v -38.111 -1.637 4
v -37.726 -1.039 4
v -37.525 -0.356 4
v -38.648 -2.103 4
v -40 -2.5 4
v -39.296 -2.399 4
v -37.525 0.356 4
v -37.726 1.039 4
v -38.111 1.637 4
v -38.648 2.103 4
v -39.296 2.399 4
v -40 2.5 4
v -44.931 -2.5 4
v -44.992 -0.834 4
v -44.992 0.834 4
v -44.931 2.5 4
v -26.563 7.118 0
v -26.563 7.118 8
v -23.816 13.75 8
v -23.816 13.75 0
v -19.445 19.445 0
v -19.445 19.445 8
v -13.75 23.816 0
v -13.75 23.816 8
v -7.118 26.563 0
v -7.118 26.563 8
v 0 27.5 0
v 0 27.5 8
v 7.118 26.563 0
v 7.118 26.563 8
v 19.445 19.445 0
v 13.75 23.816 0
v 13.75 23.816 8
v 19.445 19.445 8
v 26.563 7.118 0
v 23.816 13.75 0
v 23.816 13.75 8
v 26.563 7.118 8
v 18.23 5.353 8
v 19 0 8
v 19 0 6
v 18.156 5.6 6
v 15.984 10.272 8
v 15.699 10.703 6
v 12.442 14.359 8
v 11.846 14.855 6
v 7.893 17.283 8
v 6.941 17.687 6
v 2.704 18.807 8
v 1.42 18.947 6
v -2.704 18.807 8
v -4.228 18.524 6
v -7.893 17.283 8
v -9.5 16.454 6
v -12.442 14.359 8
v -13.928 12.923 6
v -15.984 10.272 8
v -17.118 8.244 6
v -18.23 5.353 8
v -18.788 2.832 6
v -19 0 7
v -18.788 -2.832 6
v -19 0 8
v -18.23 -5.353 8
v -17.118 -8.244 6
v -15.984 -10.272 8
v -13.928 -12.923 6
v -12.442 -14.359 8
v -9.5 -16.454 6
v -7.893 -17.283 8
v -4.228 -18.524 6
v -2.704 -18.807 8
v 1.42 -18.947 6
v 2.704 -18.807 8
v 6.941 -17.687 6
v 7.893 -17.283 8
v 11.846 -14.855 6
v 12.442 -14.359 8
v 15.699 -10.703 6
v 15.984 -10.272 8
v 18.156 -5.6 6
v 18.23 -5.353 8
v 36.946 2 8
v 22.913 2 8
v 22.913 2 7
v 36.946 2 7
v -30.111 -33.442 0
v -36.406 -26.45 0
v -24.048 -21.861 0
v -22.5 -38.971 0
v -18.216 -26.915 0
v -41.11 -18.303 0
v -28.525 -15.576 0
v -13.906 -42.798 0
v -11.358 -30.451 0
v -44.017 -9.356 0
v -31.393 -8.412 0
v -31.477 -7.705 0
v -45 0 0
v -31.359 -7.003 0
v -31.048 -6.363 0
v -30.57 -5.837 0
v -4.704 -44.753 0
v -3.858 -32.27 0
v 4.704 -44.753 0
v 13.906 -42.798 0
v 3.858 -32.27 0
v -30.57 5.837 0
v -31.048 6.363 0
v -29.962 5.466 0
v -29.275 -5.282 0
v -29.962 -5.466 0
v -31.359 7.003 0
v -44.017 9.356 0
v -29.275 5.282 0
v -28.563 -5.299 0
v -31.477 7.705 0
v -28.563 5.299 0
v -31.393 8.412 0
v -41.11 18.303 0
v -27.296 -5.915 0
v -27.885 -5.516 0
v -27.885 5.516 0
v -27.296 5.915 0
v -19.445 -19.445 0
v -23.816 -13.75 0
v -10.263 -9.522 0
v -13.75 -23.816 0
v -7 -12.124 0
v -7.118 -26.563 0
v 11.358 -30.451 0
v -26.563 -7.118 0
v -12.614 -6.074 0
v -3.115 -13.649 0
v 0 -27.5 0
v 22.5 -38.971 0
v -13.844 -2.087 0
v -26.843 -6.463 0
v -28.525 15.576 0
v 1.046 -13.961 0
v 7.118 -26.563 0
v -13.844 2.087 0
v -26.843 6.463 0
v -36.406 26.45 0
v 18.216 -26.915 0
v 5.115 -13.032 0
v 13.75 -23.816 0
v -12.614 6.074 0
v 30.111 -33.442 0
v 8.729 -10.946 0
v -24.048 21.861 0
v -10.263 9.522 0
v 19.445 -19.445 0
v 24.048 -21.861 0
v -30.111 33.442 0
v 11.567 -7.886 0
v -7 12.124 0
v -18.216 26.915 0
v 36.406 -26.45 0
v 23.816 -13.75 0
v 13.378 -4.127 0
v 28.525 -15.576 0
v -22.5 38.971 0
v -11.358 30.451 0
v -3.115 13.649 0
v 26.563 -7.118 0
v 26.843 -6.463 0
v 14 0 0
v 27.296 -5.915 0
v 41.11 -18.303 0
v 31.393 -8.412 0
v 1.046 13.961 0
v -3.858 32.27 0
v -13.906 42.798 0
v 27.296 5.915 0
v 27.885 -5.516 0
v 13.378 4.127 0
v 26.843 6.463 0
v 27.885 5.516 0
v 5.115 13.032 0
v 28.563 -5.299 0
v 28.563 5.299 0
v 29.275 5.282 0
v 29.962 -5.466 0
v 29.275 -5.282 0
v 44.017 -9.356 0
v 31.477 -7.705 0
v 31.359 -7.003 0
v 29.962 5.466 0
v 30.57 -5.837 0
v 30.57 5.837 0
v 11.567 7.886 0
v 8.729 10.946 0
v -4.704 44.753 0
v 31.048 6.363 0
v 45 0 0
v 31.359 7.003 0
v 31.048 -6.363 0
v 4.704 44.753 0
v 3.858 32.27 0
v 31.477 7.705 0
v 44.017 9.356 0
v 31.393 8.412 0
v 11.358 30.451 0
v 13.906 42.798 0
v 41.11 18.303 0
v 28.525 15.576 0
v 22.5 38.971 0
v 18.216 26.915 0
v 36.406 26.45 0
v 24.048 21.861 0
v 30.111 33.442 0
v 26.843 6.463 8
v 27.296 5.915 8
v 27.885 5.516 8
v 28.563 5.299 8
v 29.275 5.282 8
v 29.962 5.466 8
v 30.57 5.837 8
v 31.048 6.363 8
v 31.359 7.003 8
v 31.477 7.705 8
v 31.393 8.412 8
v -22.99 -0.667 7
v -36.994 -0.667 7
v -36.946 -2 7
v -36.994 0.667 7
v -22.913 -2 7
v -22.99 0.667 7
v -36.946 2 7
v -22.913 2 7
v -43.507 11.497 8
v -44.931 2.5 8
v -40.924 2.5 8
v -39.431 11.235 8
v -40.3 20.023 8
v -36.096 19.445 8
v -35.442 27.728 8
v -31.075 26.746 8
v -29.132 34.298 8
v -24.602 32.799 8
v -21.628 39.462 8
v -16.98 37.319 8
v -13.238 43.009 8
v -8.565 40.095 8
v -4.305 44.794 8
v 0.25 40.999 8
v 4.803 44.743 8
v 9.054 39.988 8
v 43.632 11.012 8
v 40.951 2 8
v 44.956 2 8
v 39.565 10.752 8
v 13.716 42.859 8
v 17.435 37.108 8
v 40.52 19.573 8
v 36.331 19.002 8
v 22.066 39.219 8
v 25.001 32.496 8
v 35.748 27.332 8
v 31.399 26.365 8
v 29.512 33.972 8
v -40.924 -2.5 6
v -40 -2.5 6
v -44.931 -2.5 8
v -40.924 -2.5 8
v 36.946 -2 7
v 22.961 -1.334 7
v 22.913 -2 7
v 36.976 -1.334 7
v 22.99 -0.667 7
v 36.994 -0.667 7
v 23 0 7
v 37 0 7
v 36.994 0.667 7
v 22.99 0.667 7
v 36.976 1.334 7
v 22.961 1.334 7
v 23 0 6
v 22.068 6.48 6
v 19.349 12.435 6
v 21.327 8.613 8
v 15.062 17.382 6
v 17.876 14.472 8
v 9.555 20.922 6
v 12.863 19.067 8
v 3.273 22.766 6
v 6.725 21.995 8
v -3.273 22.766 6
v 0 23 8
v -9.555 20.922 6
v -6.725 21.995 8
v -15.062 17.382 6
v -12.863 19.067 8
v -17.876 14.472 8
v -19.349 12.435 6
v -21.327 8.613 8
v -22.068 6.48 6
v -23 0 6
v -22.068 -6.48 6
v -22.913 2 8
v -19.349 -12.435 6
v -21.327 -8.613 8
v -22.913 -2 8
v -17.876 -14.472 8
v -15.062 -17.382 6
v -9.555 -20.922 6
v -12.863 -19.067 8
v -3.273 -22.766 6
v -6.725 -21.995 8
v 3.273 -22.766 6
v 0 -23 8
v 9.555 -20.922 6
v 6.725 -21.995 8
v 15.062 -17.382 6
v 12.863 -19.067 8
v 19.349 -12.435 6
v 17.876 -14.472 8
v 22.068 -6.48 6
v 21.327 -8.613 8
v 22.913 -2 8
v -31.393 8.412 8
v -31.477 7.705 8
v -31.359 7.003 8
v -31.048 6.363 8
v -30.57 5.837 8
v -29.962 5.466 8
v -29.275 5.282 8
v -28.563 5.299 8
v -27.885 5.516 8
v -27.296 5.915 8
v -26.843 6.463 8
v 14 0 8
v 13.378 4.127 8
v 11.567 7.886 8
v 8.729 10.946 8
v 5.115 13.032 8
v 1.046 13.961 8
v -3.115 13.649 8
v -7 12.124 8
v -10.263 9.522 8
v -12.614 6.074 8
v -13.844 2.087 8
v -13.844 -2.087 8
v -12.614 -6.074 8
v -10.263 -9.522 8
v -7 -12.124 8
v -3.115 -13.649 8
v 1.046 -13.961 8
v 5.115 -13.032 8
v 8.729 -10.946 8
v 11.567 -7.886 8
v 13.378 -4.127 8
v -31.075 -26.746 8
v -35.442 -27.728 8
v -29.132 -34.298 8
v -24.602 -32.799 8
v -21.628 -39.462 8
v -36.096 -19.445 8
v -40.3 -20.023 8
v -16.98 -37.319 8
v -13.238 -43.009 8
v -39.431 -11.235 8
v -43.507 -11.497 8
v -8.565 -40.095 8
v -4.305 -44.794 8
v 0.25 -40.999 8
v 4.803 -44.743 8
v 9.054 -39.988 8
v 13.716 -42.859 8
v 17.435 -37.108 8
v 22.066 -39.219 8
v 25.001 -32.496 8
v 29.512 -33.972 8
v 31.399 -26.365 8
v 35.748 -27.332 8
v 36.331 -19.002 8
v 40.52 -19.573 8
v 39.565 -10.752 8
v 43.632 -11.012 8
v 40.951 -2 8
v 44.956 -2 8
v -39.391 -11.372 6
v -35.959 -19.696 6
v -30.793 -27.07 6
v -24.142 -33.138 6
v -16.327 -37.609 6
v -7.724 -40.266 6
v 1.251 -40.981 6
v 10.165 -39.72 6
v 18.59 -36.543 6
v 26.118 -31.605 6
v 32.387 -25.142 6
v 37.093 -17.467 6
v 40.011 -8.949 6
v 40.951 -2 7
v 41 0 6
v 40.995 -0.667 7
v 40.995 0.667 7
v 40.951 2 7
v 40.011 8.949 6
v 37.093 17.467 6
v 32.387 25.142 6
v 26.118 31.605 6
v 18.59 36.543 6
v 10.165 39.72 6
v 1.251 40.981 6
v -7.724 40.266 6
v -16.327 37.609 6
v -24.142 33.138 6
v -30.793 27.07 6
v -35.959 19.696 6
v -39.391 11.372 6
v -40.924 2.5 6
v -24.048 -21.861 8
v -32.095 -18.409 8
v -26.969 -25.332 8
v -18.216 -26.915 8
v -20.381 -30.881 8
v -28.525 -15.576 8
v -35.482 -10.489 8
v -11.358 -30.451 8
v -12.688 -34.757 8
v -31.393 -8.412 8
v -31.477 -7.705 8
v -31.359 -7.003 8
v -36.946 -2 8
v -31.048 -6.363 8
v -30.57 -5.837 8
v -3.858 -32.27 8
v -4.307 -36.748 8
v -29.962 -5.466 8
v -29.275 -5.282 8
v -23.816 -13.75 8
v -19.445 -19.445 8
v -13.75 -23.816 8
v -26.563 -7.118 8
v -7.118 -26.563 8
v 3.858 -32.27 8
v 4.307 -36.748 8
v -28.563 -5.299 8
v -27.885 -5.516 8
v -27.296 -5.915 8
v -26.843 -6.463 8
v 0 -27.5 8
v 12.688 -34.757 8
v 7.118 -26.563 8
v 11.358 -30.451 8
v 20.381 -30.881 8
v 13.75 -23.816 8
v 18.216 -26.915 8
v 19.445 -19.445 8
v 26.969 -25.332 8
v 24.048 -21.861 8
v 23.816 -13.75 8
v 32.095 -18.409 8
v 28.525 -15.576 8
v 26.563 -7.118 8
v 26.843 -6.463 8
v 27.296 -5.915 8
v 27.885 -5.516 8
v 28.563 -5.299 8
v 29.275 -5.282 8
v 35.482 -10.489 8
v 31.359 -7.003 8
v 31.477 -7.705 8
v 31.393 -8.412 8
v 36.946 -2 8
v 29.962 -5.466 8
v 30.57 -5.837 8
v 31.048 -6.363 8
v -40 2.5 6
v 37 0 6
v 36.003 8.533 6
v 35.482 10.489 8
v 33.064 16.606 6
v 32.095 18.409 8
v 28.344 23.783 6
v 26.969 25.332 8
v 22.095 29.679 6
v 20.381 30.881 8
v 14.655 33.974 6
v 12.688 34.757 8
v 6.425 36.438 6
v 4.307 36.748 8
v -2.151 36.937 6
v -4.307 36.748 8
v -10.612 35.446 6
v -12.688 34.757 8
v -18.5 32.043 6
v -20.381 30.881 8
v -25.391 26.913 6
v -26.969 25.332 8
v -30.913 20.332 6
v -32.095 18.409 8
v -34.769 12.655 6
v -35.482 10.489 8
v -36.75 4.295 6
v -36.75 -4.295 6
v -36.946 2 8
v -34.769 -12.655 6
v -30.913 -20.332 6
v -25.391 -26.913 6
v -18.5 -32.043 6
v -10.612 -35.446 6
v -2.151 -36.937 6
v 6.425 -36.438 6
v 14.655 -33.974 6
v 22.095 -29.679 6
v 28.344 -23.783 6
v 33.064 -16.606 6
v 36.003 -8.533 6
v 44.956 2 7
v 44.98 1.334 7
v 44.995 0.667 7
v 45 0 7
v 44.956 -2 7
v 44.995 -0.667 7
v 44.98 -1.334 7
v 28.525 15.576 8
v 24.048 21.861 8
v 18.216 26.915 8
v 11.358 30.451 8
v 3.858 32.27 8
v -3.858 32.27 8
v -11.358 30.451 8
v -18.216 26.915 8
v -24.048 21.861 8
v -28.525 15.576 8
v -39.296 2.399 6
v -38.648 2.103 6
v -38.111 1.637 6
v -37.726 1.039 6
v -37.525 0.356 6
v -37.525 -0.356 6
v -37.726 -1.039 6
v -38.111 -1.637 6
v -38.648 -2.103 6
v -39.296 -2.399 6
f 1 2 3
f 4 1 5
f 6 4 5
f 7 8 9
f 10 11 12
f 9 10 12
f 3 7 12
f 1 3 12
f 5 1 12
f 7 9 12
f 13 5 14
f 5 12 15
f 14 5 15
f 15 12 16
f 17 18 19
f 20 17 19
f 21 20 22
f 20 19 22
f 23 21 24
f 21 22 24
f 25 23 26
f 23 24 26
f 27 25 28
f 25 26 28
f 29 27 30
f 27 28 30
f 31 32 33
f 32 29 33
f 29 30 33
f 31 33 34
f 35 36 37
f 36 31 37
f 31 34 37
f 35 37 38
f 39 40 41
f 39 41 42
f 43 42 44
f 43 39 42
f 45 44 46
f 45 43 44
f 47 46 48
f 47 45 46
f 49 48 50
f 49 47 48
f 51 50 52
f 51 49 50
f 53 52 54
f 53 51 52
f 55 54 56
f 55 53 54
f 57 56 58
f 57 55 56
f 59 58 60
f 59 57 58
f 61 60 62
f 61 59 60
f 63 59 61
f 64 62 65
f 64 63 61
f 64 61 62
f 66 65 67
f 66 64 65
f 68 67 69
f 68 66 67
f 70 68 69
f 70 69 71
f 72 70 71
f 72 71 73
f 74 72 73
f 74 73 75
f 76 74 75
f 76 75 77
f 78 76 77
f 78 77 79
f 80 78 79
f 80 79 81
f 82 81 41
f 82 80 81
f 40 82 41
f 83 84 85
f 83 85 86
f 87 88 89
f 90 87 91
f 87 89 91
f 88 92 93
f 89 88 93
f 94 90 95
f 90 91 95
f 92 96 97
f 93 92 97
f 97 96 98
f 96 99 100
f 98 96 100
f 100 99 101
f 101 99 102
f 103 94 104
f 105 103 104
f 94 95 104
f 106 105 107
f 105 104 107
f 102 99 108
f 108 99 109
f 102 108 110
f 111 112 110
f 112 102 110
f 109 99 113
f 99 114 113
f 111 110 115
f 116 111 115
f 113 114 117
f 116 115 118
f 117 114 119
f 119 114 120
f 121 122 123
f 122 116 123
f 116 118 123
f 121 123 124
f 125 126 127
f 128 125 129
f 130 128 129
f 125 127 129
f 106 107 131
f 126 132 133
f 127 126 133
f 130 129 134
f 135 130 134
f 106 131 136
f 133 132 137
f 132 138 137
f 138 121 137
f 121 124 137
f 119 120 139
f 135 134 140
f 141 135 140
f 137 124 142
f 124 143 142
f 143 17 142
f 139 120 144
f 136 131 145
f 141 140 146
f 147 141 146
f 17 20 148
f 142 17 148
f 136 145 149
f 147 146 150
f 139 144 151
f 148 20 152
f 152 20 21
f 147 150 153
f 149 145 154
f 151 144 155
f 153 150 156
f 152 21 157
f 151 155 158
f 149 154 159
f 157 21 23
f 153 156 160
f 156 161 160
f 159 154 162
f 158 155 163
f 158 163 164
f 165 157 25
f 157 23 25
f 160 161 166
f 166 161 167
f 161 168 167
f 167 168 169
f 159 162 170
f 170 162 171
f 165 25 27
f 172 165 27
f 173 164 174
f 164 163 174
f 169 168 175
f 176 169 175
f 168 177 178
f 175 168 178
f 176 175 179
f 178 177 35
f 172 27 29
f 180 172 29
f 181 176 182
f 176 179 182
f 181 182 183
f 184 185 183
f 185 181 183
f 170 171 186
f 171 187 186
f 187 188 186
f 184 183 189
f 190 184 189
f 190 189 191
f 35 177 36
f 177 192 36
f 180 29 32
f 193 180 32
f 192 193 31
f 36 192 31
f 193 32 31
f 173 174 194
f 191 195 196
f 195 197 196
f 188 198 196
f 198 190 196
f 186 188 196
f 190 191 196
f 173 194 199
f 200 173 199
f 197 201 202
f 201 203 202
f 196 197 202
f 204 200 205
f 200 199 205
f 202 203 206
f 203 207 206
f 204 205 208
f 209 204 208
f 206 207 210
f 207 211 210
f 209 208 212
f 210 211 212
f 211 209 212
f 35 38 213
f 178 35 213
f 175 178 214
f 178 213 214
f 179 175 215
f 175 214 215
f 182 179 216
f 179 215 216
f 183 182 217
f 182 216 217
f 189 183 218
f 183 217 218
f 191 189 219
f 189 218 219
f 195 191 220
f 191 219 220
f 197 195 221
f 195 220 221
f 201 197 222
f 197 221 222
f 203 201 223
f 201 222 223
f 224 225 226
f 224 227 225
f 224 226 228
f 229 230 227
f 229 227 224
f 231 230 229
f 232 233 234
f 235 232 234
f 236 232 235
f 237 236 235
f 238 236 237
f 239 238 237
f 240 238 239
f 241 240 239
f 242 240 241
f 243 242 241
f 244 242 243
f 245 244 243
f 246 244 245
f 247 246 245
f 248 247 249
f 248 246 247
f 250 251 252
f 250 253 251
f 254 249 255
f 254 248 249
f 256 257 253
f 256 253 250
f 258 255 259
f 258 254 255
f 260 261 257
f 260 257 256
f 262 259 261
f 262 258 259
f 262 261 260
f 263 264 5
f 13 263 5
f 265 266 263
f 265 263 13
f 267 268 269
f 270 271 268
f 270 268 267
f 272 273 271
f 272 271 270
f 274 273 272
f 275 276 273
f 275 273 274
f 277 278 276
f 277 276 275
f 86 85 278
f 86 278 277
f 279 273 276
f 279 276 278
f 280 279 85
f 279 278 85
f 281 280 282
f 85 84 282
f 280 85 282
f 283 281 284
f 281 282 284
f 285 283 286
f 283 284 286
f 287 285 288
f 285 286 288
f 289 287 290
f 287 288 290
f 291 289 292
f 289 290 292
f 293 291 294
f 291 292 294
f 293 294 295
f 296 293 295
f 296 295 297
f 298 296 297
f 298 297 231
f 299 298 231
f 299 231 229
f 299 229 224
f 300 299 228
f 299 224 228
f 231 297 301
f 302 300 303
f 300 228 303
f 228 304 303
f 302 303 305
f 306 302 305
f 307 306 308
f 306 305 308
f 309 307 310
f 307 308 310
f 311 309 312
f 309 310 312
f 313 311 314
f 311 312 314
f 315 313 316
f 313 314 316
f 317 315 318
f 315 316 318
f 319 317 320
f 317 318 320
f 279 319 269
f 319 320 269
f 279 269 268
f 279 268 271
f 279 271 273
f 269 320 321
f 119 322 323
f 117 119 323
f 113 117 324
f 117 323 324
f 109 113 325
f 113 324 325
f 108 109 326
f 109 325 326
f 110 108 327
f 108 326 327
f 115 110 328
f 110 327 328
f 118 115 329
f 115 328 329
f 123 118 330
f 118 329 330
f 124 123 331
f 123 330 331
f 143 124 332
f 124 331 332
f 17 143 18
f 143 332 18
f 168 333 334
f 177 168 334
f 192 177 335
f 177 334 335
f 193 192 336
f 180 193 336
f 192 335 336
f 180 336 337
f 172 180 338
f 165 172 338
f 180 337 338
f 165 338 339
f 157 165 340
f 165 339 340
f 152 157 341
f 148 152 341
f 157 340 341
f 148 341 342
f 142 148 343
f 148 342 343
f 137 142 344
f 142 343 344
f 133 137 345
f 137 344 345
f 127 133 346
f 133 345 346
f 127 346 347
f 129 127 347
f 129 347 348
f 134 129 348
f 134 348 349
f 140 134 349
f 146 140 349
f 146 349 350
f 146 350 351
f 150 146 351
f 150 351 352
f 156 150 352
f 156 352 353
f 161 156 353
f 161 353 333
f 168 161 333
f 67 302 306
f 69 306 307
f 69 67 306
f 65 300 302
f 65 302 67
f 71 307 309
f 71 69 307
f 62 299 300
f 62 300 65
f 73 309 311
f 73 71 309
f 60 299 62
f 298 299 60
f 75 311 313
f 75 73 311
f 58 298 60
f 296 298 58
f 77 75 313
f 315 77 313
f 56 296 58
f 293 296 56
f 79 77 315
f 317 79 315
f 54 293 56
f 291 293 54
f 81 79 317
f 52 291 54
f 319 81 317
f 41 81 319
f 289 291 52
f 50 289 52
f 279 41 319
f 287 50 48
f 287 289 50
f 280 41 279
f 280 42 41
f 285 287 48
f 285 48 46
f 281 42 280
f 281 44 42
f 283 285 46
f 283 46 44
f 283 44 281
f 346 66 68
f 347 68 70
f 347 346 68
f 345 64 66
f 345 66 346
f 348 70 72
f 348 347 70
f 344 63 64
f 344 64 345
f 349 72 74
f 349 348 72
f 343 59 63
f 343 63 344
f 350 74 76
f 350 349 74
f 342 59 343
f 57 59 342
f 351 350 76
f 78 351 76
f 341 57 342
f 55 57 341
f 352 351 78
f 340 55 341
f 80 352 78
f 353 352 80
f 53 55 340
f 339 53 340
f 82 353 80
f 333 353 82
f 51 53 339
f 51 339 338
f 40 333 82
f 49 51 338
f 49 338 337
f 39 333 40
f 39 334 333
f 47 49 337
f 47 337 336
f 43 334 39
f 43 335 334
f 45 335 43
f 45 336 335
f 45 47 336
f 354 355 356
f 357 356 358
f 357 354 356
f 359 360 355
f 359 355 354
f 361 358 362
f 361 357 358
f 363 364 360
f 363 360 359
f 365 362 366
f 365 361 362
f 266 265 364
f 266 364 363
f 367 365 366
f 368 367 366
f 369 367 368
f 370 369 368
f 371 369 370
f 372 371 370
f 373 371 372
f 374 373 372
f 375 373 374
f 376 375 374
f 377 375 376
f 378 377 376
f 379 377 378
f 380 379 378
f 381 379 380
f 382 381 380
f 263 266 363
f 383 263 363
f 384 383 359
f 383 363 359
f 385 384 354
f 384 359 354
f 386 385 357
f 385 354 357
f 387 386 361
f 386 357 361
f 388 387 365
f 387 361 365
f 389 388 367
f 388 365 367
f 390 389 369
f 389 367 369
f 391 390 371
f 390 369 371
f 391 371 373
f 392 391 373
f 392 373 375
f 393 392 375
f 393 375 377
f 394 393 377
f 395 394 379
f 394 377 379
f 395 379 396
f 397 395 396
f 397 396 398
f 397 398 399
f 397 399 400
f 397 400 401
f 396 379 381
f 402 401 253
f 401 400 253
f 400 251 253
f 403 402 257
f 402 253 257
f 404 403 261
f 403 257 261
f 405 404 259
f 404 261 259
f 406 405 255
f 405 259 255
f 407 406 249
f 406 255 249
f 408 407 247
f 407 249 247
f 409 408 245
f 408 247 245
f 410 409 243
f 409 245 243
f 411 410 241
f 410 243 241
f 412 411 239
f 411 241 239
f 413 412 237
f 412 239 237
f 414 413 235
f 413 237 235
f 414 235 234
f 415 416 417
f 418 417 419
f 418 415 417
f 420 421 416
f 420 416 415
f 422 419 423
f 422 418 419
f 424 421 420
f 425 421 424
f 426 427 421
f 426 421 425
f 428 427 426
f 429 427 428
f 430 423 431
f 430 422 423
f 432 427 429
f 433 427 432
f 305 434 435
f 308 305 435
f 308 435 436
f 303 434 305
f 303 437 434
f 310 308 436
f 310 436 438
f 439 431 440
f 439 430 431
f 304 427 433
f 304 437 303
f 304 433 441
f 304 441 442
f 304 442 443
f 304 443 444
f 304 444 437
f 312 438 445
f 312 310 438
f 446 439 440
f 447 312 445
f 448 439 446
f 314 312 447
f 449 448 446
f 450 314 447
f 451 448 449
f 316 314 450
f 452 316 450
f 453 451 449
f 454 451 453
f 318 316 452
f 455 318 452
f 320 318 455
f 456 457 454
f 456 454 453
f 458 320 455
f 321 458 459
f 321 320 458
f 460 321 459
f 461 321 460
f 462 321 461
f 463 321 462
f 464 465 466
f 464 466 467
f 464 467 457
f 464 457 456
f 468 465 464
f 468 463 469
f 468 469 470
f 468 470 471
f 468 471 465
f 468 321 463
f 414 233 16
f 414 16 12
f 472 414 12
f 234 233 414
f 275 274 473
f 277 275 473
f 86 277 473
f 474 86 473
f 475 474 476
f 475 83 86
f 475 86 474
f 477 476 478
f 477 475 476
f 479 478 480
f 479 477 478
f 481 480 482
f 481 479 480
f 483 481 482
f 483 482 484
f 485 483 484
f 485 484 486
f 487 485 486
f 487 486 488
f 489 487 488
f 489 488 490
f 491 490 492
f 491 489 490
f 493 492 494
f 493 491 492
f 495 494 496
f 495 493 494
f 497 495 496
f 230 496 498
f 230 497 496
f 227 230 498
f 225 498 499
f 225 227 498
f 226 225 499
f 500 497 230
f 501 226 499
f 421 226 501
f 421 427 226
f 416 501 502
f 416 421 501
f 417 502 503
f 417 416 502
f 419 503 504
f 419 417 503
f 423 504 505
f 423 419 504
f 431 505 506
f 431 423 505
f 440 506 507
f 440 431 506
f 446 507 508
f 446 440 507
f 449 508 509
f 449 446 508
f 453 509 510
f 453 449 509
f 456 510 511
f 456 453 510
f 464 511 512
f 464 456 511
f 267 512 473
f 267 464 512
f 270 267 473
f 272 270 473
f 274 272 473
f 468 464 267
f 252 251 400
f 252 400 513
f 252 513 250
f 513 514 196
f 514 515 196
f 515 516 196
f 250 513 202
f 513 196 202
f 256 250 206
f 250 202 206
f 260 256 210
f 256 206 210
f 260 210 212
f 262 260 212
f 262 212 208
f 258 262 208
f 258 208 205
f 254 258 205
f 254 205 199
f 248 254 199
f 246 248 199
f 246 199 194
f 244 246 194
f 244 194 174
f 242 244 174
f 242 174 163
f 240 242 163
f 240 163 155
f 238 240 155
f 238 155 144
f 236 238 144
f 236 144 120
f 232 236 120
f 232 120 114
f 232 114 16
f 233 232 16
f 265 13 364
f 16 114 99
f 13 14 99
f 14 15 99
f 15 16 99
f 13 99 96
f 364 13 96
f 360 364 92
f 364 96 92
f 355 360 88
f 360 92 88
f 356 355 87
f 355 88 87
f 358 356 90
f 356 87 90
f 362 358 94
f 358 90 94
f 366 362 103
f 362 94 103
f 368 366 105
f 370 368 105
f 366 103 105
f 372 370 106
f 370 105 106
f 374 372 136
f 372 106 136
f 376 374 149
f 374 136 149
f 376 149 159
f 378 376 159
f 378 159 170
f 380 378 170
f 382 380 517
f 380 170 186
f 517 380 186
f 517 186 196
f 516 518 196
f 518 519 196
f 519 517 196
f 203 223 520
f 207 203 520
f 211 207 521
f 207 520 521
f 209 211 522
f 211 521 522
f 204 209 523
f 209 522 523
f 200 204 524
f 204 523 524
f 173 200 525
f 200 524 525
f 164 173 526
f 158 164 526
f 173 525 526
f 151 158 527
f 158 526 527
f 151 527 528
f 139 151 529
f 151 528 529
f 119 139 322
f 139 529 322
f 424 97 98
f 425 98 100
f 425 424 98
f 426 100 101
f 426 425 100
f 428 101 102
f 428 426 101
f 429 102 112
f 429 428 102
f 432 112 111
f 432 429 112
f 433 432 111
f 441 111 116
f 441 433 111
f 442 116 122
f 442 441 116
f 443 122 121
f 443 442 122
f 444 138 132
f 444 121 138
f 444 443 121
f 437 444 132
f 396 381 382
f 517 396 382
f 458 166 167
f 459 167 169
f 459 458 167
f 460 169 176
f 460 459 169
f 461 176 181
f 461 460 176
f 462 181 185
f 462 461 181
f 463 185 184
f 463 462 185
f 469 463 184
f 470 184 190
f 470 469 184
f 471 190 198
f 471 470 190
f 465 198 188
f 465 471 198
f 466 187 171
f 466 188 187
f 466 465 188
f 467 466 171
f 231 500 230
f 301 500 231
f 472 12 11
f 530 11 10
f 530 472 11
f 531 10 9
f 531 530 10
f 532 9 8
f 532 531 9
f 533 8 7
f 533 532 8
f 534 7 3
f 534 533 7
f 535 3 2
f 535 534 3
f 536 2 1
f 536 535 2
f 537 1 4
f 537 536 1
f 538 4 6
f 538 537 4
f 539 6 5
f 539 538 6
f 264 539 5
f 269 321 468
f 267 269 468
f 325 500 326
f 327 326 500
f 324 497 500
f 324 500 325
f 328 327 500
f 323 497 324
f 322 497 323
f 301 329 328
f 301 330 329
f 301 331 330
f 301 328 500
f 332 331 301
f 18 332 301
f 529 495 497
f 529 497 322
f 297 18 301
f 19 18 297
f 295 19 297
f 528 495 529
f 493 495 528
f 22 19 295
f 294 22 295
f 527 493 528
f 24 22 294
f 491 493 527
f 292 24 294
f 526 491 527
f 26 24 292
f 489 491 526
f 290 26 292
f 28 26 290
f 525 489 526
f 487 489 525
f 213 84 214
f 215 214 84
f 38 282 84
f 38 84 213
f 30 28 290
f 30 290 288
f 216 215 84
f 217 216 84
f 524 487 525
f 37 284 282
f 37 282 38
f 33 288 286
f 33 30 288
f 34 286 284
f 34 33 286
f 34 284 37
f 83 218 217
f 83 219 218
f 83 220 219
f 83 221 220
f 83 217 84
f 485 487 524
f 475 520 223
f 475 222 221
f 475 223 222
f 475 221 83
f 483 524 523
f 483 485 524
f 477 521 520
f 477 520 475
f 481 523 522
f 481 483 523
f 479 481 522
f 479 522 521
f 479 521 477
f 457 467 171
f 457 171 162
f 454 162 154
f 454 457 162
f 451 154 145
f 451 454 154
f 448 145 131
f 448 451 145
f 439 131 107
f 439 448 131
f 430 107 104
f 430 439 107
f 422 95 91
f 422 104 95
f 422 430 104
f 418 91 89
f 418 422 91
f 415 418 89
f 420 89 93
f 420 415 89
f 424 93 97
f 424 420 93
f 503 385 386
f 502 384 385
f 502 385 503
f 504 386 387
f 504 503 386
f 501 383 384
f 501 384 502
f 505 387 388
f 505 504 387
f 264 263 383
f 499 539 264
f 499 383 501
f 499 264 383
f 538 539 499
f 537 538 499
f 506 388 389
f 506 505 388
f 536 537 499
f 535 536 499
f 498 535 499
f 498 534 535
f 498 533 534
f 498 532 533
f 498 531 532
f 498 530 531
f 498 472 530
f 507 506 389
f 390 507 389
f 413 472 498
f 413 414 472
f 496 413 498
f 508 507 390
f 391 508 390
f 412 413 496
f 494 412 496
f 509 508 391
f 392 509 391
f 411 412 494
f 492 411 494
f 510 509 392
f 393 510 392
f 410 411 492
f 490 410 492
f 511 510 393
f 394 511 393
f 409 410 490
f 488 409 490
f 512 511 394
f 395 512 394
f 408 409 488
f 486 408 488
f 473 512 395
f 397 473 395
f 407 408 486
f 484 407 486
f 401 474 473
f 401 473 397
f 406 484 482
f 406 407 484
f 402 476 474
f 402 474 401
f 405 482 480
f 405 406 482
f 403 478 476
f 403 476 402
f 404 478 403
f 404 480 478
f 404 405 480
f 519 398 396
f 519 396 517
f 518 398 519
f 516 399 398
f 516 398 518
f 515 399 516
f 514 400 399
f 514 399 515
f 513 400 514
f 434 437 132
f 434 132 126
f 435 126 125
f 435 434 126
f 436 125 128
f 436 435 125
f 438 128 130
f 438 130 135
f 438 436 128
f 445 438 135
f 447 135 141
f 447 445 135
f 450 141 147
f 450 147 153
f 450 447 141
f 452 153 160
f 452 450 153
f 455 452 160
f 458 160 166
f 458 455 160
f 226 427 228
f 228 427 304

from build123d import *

# Parameters (mm, degrees)
SKETCH_1_R            = 45
EXTRUDE_1_DEPTH       = 8
SKETCH_2_R            = 14
CUT_EXTRUDE_1_DEPTH   = 65.140470843
SKETCH_3_R            = 41
SKETCH_3_R_2          = 37
CUT_EXTRUDE_1_2_DEPTH = 2
CUT_EXTRUDE_2_DEPTH   = 4
CUT_EXTRUDE_3_DEPTH   = 65.140470843
SKETCH_6_R            = 23
SKETCH_6_R_2          = 19
CUT_EXTRUDE_2_2_DEPTH = 2
SKETCH_7_W            = 18
SKETCH_7_H            = 4
SKETCH_7_W_2          = 26
CUT_EXTRUDE_3_2_DEPTH = 1


with BuildPart() as part:
    # 草图1 → 凸台-拉伸1 (new body)
    with BuildSketch(Plane.XY):
        Circle(SKETCH_1_R)
    extrude(amount=EXTRUDE_1_DEPTH)

    # 草图2 → Cut-Extrude 1 (cut, through all)
    with BuildSketch(Plane.XY.offset(8)):
        Circle(SKETCH_2_R)
    extrude(amount=-CUT_EXTRUDE_1_DEPTH, mode=Mode.SUBTRACT)

    # 草图3 → Cut-Extrude 1 2 (cut)
    with BuildSketch(Plane.XY.offset(8)):
        Circle(SKETCH_3_R)
        Circle(SKETCH_3_R_2, mode=Mode.SUBTRACT)
    extrude(amount=-CUT_EXTRUDE_1_2_DEPTH, mode=Mode.SUBTRACT)

    # 草图4 → Cut-Extrude 2 (cut)
    with BuildSketch(Plane.XY.offset(8)):
        with BuildLine():
            Line((-45, 2.5), (-40, 2.5))
            ThreePointArc((-40, 2.5), (-37.5, 0), (-40, -2.5))
            Line((-40, -2.5), (-45, -2.5))
            ThreePointArc((-45, -2.5), (-47.5, 0), (-45, 2.5))
        make_face()
    extrude(amount=-CUT_EXTRUDE_2_DEPTH, mode=Mode.SUBTRACT)

    # 草图5 → Cut-Extrude 3 (cut, through all)
    with BuildSketch(Plane.XY.offset(8)):
        with BuildLine():
            ThreePointArc((31.392589354, 8.411618966), (0, 32.5), (-31.392589354, 8.411618966))
            ThreePointArc((-31.392589354, 8.411618966), (-29.624822401, 5.349756787), (-26.562960223, 7.11752374))
            ThreePointArc((-26.562960223, 7.11752374), (0, 27.5), (26.562960223, 7.11752374))
            ThreePointArc((26.562960223, 7.11752374), (29.624822401, 5.349756787), (31.392589354, 8.411618966))
        make_face()
    cut_extrude_3 = extrude(amount=-CUT_EXTRUDE_3_DEPTH, mode=Mode.SUBTRACT)

    # 镜向1: Cut-Extrude 3 across plane
    add(cut_extrude_3.mirror(Plane.ZX), mode=Mode.SUBTRACT)

    # 草图6 → Cut-Extrude 2 2 (cut)
    with BuildSketch(Plane.XY.offset(8)):
        Circle(SKETCH_6_R)
        Circle(SKETCH_6_R_2, mode=Mode.SUBTRACT)
    extrude(amount=-CUT_EXTRUDE_2_2_DEPTH, mode=Mode.SUBTRACT)

    # 草图7 → Cut-Extrude 3 2 (cut)
    with BuildSketch(Plane.XY.offset(8)):
        with Locations((-28, 0)):
            Rectangle(SKETCH_7_W, SKETCH_7_H)
        with Locations((32, 0)):
            Rectangle(SKETCH_7_W_2, SKETCH_7_H)
    extrude(amount=-CUT_EXTRUDE_3_2_DEPTH, mode=Mode.SUBTRACT)


solid = part.part
